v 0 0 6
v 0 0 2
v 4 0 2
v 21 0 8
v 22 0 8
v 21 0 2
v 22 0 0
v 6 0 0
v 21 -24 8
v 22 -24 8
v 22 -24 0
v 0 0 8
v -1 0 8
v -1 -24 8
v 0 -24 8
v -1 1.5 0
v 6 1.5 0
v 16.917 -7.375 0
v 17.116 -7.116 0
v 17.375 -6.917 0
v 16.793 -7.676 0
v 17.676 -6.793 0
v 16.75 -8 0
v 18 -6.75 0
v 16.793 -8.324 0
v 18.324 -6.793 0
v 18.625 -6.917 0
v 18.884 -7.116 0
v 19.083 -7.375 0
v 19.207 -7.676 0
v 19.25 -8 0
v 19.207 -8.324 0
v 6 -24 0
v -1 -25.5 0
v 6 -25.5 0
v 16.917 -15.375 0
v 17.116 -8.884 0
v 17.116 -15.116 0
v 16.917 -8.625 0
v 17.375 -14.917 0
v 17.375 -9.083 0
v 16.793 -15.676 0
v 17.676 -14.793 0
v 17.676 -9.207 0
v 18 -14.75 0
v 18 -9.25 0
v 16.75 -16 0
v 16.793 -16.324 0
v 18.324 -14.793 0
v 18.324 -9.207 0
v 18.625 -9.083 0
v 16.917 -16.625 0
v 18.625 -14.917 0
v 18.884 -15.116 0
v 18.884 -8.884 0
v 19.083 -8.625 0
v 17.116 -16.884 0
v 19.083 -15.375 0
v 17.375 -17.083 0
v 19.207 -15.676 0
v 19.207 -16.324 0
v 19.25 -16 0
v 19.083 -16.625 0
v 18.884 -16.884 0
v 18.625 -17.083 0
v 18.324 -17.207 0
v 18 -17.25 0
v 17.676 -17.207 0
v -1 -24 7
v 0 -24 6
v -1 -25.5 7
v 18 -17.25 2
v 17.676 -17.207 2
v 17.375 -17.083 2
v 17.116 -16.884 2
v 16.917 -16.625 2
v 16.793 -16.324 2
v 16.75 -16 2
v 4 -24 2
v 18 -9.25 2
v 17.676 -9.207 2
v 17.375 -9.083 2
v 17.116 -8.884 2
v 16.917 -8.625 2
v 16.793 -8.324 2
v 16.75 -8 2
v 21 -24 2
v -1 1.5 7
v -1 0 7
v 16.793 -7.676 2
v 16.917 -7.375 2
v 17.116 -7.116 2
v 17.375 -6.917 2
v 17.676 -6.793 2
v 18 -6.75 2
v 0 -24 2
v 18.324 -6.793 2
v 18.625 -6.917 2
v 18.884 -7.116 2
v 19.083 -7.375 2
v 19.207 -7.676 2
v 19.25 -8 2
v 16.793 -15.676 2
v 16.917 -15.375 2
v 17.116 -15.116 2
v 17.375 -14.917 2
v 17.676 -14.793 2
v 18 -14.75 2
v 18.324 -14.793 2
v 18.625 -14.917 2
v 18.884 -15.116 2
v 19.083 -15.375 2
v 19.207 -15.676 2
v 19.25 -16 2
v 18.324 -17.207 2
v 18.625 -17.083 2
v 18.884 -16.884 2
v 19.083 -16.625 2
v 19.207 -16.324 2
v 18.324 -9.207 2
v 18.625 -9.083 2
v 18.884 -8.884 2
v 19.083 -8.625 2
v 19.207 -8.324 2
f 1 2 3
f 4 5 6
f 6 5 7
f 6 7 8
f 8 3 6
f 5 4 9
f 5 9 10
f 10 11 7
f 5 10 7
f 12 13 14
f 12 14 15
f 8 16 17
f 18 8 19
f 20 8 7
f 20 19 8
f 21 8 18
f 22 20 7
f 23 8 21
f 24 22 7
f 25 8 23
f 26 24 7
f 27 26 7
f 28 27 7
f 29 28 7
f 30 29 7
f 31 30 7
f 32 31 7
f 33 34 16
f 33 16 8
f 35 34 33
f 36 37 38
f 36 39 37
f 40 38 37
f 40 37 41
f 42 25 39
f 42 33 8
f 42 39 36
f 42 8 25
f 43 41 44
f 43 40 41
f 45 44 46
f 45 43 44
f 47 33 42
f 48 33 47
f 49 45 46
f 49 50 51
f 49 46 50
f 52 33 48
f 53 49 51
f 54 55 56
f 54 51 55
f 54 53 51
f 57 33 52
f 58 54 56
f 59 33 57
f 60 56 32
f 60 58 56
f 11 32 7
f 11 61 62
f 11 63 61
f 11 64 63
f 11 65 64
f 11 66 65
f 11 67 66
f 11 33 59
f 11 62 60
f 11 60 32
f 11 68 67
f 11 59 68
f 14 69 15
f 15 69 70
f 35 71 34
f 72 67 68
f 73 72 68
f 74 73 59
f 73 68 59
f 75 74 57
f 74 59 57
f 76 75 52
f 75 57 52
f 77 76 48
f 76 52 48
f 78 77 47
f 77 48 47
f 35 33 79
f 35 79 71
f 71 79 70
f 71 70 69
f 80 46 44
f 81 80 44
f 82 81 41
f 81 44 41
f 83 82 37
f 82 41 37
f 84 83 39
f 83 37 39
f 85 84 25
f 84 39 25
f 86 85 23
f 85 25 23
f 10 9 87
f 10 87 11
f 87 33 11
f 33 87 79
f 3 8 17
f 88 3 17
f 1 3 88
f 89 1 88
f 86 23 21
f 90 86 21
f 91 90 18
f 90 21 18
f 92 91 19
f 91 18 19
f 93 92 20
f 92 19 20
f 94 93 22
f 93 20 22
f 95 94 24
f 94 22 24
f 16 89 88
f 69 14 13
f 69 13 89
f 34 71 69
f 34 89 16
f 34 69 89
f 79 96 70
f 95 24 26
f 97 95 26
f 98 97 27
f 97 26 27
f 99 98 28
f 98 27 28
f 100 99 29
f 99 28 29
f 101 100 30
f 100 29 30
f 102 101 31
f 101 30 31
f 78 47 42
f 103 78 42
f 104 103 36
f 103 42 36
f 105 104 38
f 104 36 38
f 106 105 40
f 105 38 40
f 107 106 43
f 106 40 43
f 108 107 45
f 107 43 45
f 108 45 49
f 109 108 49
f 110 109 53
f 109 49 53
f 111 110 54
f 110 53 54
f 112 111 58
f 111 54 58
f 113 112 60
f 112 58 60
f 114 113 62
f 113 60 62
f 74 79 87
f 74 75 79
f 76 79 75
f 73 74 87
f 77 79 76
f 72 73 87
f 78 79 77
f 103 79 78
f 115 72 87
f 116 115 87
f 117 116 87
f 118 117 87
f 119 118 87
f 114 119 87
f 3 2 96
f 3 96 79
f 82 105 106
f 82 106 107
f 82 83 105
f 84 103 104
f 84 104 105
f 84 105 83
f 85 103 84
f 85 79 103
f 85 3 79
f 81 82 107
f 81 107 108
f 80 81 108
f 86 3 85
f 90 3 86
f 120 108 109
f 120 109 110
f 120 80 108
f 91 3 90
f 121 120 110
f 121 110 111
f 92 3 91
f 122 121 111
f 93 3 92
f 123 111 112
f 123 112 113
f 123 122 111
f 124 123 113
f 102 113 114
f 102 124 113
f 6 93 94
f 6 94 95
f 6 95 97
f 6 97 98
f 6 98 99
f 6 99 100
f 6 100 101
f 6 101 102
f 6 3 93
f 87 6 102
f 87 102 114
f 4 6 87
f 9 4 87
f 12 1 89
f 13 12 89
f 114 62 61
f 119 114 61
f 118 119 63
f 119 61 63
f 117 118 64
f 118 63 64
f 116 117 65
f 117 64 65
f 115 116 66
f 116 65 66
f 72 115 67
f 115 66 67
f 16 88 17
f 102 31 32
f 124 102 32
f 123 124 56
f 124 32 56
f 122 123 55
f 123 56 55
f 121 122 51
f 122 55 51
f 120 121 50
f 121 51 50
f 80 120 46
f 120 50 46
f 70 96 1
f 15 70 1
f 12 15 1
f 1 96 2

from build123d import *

# Parameters (mm, degrees)
F1_DEPTH = 8
F2_DEPTH = 2
F4_DEPTH = 1.5


with BuildPart() as f1:
    # F0 (on Top) → F1 (new body)
    with BuildSketch(Plane.XY):
        Polygon((0, -8), (0, 0), (-1, 0), (-1, -24), (0, -24), (0, -16), (0, -12), align=None)
    extrude(amount=F1_DEPTH)



with BuildPart() as f1b:
    # F0 (on Top) → F1, piece 2 (new body)
    with BuildSketch(Plane.XY):
        Polygon((22, 0), (21, 0), (21, -8), (21, -16), (21, -24), (22, -24), align=None)
    extrude(amount=F1_DEPTH)


with BuildPart() as f1_1:
    add(f1.part)

    add(f1b.part)  # F2 merges F1b
    # F0 (on Top) → F2 (join)
    with BuildSketch(Plane.XY):
        with BuildLine():
            Line((18, 0), (0, 0))
            Line((0, 0), (0, -8))
            Line((0, -8), (16.75, -8))
            ThreePointArc((16.75, -8), (17.1161165235, -7.1161165235), (18, -6.75))
            Line((18, -6.75), (18, 0))
        make_face()
        Polygon((0, -8), (0, 0), (-1, 0), (-1, -24), (0, -24), (0, -16), (0, -12), align=None)
        with BuildLine():
            Line((21, 0), (18, 0))
            Line((18, 0), (18, -6.75))
            ThreePointArc((18, -6.75), (18.8838834765, -7.1161165235), (19.25, -8))
            Line((19.25, -8), (21, -8))
            Line((21, -8), (21, 0))
        make_face()
        Polygon((22, 0), (21, 0), (21, -8), (21, -16), (21, -24), (22, -24), align=None)
        with BuildLine():
            Line((16.75, -16), (0, -16))
            Line((0, -16), (0, -24))
            Line((0, -24), (18, -24))
            Line((18, -24), (18, -17.25))
            ThreePointArc((18, -17.25), (17.1161165235, -16.8838834765), (16.75, -16))
        make_face()
        with BuildLine():
            Line((21, -24), (21, -16))
            Line((21, -16), (19.25, -16))
            ThreePointArc((19.25, -16), (18.8838834765, -16.8838834765), (18, -17.25))
            Line((18, -17.25), (18, -24))
            Line((18, -24), (21, -24))
        make_face()
        with BuildLine():
            Line((18, -12), (0, -12))
            Line((0, -12), (0, -16))
            Line((0, -16), (16.75, -16))
            ThreePointArc((16.75, -16), (17.1161165235, -15.1161165235), (18, -14.75))
            Line((18, -14.75), (18, -12))
        make_face()
        with BuildLine():
            Line((21, -16), (21, -8))
            Line((21, -8), (19.25, -8))
            ThreePointArc((19.25, -8), (18.8838834765, -8.8838834765), (18, -9.25))
            Line((18, -9.25), (18, -12))
            Line((18, -12), (18, -14.75))
            ThreePointArc((18, -14.75), (18.8838834765, -15.1161165235), (19.25, -16))
            Line((19.25, -16), (21, -16))
        make_face()
        with BuildLine():
            Line((16.75, -8), (0, -8))
            Line((0, -8), (0, -12))
            Line((0, -12), (18, -12))
            Line((18, -12), (18, -9.25))
            ThreePointArc((18, -9.25), (17.1161165235, -8.8838834765), (16.75, -8))
        make_face()
    extrude(amount=F2_DEPTH)

    # F3 (on face) → F4 (join)
    with BuildSketch(Plane.XZ.offset(24)):
        Polygon((4, 2), (0, 2), (0, 6), (-1, 7), (-1, 0), (6, 0), align=None)
        Polygon((0, 6), (0, 2), (4, 2), align=None)
    extrude(amount=F4_DEPTH)

    # F6: F1 across plane


with BuildPart() as f1_2:
    add(f1_1.part)
    add(f1_1.part.mirror(Plane.XZ.offset(12)))


solid = f1_2.part
